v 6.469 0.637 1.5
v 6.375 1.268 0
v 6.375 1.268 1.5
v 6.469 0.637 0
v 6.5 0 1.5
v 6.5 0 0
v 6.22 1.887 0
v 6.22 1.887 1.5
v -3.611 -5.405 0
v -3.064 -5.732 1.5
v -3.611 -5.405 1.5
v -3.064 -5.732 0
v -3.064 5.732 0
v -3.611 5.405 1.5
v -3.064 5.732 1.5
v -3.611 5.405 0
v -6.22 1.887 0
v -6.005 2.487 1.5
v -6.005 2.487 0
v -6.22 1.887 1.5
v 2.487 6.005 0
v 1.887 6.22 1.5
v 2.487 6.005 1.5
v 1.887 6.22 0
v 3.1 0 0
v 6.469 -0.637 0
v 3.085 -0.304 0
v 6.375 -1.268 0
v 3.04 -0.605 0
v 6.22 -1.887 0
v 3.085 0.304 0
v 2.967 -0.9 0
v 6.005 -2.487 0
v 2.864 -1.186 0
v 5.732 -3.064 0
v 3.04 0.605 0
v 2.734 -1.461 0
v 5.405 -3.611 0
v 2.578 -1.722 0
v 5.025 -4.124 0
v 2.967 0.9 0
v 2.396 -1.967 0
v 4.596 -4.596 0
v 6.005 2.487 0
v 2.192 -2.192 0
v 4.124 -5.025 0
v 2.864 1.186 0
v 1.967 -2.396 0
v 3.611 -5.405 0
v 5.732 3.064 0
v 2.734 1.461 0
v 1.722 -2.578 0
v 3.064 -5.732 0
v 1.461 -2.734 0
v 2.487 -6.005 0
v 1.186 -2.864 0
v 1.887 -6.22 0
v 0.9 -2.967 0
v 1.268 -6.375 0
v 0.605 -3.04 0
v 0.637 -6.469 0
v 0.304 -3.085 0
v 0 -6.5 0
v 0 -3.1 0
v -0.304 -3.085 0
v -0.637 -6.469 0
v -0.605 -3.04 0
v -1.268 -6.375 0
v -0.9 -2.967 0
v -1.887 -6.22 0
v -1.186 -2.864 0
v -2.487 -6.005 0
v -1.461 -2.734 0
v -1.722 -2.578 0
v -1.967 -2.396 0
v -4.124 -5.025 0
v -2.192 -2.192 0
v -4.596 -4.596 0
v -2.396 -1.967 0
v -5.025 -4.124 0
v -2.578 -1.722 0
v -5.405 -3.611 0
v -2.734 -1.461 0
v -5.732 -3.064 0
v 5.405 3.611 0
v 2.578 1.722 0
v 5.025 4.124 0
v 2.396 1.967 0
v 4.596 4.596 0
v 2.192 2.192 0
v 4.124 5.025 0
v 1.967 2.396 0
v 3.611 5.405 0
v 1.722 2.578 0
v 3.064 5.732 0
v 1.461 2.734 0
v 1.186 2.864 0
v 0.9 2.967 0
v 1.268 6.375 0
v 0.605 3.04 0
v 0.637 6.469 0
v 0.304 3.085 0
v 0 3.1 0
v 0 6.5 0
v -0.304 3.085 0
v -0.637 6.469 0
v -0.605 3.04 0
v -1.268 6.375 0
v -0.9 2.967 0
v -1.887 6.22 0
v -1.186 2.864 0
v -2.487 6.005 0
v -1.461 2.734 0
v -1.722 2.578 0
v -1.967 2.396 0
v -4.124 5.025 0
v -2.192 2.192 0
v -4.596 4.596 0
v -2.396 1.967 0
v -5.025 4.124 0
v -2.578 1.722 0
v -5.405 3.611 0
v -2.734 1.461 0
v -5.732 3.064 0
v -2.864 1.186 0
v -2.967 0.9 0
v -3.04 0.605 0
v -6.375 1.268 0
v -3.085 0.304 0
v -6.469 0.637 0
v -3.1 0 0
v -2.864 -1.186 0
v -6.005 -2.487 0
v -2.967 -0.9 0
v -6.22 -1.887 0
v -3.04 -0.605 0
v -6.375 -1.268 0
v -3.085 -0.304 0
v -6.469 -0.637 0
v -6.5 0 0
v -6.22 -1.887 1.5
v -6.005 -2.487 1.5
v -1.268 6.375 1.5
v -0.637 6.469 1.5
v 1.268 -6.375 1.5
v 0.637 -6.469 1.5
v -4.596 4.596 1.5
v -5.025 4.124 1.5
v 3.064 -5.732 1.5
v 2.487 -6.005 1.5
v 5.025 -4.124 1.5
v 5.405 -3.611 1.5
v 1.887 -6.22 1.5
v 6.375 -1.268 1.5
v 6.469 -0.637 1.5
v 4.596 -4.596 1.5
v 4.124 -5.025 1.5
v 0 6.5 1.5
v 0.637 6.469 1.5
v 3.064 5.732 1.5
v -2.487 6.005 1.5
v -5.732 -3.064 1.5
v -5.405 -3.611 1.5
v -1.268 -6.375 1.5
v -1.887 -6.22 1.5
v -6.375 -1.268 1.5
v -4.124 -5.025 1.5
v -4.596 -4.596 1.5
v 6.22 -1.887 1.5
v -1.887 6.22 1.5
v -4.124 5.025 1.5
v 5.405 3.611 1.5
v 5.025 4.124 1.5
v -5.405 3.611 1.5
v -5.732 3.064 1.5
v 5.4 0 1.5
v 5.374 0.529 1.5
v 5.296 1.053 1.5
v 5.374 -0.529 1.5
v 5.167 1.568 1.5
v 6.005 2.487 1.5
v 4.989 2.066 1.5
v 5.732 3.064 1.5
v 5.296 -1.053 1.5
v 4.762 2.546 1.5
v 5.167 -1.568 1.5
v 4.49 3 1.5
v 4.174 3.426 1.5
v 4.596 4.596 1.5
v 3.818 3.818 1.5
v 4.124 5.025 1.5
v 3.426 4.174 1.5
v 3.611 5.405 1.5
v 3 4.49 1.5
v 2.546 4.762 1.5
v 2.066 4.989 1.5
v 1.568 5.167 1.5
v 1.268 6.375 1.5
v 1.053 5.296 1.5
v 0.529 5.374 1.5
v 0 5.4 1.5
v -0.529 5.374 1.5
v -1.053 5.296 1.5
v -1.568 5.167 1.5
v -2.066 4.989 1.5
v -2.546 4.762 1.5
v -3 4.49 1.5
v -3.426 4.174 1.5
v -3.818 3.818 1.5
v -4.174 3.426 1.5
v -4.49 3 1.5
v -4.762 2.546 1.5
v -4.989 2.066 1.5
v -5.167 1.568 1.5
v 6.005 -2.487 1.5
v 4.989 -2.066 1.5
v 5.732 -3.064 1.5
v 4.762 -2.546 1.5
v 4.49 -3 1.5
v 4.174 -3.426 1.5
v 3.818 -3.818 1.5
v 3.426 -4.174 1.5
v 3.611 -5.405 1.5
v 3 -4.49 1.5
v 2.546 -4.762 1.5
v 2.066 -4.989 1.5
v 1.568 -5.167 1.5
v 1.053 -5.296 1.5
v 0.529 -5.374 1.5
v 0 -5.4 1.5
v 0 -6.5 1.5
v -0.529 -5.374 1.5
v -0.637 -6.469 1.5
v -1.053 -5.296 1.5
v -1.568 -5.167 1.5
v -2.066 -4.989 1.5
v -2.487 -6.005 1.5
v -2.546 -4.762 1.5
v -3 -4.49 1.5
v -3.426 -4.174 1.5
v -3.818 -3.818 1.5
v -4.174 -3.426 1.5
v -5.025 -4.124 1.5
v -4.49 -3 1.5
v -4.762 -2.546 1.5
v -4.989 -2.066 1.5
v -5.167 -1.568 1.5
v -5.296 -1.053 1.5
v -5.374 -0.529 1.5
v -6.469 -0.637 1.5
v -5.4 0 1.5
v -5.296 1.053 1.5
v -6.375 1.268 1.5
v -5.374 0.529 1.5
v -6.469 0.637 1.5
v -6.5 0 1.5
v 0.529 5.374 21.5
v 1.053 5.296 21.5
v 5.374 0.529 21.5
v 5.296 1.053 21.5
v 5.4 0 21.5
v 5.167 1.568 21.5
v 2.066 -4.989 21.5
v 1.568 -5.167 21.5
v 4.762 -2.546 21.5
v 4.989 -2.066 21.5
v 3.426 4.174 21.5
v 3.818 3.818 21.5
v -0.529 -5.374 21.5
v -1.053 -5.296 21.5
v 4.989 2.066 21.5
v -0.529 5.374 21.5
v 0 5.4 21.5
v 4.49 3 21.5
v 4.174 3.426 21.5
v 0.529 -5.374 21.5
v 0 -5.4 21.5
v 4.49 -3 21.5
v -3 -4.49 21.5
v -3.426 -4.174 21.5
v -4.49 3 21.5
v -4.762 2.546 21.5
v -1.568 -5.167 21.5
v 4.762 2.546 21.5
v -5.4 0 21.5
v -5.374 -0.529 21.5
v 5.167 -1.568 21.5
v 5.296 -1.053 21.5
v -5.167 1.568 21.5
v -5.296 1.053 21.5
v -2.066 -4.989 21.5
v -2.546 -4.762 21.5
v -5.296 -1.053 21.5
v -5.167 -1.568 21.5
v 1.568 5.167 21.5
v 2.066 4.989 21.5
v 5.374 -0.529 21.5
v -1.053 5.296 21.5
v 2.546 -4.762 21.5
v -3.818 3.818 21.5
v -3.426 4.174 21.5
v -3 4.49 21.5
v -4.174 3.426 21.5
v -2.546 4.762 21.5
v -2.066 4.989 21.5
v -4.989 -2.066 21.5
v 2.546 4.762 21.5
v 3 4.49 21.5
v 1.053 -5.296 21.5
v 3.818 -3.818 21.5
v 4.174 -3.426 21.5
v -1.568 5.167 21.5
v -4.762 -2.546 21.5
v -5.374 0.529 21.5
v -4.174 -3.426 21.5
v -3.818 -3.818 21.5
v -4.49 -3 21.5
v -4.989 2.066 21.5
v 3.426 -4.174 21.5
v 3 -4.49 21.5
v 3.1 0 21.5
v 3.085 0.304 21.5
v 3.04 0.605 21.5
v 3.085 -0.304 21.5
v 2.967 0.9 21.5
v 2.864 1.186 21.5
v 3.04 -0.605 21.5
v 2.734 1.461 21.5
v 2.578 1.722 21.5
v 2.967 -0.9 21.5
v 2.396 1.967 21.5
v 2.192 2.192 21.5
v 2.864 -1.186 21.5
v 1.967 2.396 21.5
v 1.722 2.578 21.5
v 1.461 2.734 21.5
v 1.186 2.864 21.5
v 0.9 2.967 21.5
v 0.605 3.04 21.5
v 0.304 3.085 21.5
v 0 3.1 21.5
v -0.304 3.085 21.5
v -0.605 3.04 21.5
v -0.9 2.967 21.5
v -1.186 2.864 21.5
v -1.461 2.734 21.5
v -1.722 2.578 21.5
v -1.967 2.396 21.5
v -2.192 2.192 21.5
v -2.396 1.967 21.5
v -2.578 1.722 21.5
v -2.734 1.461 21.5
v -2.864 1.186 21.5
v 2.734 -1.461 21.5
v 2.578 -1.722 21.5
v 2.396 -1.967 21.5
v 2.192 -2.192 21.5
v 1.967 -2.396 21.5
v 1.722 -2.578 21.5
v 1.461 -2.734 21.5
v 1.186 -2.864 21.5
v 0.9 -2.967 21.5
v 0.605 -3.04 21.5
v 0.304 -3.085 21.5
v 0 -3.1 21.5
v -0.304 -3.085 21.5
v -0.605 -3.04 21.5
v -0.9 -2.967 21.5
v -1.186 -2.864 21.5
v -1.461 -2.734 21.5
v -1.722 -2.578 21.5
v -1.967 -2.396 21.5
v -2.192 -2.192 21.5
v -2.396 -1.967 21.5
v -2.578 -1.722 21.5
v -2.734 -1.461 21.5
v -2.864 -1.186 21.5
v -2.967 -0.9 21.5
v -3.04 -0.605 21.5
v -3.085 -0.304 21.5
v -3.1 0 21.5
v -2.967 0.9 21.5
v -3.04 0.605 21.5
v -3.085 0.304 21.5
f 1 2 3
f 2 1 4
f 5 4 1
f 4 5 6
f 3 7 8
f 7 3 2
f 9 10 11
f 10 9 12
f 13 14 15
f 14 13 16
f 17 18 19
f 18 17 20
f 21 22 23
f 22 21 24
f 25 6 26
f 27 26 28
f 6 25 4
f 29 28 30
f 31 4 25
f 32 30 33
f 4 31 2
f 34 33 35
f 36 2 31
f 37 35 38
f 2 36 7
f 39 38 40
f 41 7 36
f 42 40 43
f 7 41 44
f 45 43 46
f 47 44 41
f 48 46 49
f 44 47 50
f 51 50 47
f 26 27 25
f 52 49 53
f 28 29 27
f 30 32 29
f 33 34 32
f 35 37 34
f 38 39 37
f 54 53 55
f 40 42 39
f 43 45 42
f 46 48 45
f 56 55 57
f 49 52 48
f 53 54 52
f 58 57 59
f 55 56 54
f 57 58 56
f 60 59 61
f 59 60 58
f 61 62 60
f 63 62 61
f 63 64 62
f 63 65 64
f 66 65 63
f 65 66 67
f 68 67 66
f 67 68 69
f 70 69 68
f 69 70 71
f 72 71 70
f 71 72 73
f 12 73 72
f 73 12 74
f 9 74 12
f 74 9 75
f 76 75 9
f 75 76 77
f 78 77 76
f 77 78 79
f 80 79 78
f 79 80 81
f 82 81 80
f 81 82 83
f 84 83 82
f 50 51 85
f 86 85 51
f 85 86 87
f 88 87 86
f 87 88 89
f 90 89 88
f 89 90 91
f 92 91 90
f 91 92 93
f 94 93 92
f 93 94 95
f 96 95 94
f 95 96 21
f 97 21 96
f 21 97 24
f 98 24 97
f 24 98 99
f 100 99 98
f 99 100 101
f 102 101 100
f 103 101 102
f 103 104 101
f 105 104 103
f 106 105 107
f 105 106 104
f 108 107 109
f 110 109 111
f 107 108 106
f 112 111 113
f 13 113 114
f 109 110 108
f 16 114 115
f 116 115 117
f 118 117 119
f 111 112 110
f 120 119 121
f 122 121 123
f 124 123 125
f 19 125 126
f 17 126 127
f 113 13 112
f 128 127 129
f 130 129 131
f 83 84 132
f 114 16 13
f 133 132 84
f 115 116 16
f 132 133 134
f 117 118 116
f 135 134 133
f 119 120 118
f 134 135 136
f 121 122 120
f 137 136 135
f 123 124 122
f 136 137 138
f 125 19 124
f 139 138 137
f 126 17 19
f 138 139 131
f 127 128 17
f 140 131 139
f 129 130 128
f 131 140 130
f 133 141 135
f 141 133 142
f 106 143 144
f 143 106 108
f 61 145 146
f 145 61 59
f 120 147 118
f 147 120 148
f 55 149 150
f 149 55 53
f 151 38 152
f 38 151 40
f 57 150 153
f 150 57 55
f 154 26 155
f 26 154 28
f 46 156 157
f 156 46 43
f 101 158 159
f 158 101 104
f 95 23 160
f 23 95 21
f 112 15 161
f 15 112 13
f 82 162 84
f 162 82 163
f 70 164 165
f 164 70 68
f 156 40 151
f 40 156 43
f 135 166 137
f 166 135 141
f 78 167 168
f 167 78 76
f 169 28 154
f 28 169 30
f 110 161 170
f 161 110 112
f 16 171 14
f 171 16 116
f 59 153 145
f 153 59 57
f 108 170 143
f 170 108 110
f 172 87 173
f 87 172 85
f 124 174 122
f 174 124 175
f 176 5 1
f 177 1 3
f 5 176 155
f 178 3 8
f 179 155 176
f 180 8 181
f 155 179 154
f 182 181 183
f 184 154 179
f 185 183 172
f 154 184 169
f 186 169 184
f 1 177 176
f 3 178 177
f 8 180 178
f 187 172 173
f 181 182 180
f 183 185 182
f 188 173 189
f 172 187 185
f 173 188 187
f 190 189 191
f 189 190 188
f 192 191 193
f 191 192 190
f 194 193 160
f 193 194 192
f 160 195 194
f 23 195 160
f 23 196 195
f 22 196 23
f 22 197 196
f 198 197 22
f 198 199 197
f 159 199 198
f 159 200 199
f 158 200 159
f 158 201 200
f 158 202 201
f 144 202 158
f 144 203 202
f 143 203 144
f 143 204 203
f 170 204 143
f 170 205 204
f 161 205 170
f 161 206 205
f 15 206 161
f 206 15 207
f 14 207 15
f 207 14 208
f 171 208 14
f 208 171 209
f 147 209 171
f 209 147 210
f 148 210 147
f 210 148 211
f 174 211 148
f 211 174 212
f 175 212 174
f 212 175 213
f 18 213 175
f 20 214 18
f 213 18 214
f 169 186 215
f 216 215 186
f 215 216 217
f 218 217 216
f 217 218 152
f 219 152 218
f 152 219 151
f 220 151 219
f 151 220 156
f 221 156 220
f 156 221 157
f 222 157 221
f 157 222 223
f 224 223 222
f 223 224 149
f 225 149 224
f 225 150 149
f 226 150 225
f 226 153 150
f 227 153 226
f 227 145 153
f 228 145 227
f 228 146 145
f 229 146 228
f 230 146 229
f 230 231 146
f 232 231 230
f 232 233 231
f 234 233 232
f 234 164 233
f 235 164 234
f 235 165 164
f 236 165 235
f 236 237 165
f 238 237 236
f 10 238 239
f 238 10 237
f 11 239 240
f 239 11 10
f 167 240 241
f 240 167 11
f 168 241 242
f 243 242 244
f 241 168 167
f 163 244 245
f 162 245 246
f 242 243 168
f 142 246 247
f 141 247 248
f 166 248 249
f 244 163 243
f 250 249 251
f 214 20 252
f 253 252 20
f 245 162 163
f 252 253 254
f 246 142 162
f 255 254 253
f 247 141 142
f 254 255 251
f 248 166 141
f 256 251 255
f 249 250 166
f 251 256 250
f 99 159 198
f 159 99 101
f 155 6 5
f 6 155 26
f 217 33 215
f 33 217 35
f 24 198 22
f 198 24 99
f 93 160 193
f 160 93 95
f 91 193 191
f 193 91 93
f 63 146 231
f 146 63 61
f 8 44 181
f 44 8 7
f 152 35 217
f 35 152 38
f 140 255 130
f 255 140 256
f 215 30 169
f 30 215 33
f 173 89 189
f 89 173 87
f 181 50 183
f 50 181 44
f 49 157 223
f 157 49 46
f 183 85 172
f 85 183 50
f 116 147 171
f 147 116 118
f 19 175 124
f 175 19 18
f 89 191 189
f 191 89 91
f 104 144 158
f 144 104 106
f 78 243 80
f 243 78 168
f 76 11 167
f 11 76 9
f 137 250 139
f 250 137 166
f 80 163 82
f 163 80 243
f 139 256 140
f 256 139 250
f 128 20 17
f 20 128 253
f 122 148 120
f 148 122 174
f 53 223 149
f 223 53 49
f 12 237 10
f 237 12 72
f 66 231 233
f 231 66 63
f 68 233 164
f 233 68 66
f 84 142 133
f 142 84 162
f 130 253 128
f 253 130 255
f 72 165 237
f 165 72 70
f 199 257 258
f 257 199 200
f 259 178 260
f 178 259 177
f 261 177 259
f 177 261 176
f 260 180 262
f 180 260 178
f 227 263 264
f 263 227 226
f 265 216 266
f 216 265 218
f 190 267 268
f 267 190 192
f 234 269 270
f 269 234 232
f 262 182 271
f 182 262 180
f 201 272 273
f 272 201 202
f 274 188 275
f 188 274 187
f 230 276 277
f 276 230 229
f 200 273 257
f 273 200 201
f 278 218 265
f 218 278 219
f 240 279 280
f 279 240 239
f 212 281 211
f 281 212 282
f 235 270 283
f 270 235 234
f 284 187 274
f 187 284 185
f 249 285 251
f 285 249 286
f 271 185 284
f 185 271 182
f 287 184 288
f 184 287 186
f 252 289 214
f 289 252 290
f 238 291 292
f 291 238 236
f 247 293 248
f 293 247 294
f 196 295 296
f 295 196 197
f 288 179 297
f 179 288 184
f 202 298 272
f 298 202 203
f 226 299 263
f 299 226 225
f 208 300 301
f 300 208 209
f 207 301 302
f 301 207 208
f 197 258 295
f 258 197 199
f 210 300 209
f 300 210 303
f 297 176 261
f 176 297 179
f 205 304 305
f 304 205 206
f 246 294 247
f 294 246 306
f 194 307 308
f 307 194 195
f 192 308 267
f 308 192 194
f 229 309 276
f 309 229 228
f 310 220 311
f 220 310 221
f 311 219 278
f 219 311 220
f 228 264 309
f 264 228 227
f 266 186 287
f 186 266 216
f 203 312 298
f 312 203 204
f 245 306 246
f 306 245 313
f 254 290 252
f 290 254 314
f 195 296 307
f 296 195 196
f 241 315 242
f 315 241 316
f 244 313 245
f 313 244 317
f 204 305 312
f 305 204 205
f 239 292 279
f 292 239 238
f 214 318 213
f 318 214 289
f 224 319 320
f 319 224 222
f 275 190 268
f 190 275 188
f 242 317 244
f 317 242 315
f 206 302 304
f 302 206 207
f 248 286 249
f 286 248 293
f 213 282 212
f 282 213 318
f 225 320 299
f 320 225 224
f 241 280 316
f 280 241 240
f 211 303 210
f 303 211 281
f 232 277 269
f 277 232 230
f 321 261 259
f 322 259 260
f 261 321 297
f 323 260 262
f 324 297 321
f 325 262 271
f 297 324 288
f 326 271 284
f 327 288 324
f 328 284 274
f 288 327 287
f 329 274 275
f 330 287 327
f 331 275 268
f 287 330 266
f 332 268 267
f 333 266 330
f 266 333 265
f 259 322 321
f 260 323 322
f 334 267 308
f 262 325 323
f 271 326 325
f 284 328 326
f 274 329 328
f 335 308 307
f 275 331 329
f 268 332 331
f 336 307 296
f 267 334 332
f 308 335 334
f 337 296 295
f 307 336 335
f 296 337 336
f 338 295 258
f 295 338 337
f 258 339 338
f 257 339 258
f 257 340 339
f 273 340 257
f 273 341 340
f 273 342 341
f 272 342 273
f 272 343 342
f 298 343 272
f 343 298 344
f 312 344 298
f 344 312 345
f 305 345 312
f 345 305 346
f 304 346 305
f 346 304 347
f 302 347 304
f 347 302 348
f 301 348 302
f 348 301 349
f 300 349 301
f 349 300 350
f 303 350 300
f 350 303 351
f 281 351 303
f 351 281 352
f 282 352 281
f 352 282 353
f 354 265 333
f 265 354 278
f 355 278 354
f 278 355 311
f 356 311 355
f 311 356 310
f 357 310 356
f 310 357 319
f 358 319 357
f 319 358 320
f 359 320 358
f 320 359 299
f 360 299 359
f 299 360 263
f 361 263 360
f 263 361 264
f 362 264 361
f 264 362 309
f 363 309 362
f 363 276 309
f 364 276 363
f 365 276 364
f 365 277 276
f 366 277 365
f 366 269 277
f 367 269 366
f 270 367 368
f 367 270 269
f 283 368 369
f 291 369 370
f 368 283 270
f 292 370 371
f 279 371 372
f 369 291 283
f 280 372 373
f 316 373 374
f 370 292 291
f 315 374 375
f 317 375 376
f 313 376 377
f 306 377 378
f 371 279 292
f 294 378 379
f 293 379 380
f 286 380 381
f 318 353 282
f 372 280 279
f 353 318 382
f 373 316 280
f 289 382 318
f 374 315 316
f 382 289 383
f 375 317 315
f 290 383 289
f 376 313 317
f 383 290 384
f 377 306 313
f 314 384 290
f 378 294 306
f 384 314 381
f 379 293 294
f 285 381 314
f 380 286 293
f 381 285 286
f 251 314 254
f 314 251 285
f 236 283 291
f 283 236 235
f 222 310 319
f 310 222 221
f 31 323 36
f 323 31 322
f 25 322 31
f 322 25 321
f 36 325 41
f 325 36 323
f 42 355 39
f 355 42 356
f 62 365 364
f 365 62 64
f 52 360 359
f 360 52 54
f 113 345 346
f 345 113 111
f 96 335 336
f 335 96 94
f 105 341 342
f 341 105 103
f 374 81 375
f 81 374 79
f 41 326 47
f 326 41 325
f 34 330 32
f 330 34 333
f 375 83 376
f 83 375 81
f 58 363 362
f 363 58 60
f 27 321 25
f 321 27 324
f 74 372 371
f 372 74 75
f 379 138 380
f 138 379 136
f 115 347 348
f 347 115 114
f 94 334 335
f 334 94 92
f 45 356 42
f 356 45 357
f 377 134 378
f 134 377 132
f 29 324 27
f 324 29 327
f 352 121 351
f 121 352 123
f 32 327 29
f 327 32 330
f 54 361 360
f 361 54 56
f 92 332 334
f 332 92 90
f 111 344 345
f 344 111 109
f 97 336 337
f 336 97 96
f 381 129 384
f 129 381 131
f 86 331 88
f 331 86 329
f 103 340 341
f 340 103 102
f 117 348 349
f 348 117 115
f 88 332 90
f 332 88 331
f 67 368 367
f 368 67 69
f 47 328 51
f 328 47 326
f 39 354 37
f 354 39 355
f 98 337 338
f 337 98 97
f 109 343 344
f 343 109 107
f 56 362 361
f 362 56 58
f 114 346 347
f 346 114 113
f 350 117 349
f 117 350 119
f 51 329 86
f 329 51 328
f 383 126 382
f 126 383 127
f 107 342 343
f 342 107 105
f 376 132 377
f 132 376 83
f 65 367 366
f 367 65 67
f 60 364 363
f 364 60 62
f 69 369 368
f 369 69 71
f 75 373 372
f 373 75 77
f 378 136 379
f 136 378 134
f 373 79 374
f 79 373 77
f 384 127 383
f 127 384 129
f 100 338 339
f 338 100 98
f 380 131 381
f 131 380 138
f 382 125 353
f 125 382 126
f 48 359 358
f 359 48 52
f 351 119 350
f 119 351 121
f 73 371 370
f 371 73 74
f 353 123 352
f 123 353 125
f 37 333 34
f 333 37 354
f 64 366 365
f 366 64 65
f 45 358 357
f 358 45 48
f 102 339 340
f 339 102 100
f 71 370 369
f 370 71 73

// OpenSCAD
// Adapter sleeve: 0.2 mL PCR tube for a 1.5 mL rack hole
// Print orientation: collar down on the bed (z = 0), sleeve up (+Z)

$fn = 64;

// ---- Dimensions (mm) ----
collar_d      = 13;    // collar diameter
collar_h      = 1.5;   // collar thickness (z = 0 to 1.5)
sleeve_od     = 10.8;  // sleeve outer diameter
sleeve_top_z  = 21.5;  // top of sleeve (sleeve runs z = 1.5 to 21.5)
bore_d        = 6.2;   // through-bore diameter
eps           = 0.5;   // cutter overshoot past faces

total_h = sleeve_top_z; // full height for the through-bore

// ---- Model ----
difference() {
    union() {
        // Collar
        cylinder(d = collar_d, h = collar_h);
        // Sleeve body (slightly overlaps collar to fuse solids)
        translate([0, 0, collar_h - 0.01])
            cylinder(d = sleeve_od, h = sleeve_top_z - collar_h + 0.01);
    }
    // Straight through-bore
    translate([0, 0, -eps])
        cylinder(d = bore_d, h = total_h + 2 * eps);
}
